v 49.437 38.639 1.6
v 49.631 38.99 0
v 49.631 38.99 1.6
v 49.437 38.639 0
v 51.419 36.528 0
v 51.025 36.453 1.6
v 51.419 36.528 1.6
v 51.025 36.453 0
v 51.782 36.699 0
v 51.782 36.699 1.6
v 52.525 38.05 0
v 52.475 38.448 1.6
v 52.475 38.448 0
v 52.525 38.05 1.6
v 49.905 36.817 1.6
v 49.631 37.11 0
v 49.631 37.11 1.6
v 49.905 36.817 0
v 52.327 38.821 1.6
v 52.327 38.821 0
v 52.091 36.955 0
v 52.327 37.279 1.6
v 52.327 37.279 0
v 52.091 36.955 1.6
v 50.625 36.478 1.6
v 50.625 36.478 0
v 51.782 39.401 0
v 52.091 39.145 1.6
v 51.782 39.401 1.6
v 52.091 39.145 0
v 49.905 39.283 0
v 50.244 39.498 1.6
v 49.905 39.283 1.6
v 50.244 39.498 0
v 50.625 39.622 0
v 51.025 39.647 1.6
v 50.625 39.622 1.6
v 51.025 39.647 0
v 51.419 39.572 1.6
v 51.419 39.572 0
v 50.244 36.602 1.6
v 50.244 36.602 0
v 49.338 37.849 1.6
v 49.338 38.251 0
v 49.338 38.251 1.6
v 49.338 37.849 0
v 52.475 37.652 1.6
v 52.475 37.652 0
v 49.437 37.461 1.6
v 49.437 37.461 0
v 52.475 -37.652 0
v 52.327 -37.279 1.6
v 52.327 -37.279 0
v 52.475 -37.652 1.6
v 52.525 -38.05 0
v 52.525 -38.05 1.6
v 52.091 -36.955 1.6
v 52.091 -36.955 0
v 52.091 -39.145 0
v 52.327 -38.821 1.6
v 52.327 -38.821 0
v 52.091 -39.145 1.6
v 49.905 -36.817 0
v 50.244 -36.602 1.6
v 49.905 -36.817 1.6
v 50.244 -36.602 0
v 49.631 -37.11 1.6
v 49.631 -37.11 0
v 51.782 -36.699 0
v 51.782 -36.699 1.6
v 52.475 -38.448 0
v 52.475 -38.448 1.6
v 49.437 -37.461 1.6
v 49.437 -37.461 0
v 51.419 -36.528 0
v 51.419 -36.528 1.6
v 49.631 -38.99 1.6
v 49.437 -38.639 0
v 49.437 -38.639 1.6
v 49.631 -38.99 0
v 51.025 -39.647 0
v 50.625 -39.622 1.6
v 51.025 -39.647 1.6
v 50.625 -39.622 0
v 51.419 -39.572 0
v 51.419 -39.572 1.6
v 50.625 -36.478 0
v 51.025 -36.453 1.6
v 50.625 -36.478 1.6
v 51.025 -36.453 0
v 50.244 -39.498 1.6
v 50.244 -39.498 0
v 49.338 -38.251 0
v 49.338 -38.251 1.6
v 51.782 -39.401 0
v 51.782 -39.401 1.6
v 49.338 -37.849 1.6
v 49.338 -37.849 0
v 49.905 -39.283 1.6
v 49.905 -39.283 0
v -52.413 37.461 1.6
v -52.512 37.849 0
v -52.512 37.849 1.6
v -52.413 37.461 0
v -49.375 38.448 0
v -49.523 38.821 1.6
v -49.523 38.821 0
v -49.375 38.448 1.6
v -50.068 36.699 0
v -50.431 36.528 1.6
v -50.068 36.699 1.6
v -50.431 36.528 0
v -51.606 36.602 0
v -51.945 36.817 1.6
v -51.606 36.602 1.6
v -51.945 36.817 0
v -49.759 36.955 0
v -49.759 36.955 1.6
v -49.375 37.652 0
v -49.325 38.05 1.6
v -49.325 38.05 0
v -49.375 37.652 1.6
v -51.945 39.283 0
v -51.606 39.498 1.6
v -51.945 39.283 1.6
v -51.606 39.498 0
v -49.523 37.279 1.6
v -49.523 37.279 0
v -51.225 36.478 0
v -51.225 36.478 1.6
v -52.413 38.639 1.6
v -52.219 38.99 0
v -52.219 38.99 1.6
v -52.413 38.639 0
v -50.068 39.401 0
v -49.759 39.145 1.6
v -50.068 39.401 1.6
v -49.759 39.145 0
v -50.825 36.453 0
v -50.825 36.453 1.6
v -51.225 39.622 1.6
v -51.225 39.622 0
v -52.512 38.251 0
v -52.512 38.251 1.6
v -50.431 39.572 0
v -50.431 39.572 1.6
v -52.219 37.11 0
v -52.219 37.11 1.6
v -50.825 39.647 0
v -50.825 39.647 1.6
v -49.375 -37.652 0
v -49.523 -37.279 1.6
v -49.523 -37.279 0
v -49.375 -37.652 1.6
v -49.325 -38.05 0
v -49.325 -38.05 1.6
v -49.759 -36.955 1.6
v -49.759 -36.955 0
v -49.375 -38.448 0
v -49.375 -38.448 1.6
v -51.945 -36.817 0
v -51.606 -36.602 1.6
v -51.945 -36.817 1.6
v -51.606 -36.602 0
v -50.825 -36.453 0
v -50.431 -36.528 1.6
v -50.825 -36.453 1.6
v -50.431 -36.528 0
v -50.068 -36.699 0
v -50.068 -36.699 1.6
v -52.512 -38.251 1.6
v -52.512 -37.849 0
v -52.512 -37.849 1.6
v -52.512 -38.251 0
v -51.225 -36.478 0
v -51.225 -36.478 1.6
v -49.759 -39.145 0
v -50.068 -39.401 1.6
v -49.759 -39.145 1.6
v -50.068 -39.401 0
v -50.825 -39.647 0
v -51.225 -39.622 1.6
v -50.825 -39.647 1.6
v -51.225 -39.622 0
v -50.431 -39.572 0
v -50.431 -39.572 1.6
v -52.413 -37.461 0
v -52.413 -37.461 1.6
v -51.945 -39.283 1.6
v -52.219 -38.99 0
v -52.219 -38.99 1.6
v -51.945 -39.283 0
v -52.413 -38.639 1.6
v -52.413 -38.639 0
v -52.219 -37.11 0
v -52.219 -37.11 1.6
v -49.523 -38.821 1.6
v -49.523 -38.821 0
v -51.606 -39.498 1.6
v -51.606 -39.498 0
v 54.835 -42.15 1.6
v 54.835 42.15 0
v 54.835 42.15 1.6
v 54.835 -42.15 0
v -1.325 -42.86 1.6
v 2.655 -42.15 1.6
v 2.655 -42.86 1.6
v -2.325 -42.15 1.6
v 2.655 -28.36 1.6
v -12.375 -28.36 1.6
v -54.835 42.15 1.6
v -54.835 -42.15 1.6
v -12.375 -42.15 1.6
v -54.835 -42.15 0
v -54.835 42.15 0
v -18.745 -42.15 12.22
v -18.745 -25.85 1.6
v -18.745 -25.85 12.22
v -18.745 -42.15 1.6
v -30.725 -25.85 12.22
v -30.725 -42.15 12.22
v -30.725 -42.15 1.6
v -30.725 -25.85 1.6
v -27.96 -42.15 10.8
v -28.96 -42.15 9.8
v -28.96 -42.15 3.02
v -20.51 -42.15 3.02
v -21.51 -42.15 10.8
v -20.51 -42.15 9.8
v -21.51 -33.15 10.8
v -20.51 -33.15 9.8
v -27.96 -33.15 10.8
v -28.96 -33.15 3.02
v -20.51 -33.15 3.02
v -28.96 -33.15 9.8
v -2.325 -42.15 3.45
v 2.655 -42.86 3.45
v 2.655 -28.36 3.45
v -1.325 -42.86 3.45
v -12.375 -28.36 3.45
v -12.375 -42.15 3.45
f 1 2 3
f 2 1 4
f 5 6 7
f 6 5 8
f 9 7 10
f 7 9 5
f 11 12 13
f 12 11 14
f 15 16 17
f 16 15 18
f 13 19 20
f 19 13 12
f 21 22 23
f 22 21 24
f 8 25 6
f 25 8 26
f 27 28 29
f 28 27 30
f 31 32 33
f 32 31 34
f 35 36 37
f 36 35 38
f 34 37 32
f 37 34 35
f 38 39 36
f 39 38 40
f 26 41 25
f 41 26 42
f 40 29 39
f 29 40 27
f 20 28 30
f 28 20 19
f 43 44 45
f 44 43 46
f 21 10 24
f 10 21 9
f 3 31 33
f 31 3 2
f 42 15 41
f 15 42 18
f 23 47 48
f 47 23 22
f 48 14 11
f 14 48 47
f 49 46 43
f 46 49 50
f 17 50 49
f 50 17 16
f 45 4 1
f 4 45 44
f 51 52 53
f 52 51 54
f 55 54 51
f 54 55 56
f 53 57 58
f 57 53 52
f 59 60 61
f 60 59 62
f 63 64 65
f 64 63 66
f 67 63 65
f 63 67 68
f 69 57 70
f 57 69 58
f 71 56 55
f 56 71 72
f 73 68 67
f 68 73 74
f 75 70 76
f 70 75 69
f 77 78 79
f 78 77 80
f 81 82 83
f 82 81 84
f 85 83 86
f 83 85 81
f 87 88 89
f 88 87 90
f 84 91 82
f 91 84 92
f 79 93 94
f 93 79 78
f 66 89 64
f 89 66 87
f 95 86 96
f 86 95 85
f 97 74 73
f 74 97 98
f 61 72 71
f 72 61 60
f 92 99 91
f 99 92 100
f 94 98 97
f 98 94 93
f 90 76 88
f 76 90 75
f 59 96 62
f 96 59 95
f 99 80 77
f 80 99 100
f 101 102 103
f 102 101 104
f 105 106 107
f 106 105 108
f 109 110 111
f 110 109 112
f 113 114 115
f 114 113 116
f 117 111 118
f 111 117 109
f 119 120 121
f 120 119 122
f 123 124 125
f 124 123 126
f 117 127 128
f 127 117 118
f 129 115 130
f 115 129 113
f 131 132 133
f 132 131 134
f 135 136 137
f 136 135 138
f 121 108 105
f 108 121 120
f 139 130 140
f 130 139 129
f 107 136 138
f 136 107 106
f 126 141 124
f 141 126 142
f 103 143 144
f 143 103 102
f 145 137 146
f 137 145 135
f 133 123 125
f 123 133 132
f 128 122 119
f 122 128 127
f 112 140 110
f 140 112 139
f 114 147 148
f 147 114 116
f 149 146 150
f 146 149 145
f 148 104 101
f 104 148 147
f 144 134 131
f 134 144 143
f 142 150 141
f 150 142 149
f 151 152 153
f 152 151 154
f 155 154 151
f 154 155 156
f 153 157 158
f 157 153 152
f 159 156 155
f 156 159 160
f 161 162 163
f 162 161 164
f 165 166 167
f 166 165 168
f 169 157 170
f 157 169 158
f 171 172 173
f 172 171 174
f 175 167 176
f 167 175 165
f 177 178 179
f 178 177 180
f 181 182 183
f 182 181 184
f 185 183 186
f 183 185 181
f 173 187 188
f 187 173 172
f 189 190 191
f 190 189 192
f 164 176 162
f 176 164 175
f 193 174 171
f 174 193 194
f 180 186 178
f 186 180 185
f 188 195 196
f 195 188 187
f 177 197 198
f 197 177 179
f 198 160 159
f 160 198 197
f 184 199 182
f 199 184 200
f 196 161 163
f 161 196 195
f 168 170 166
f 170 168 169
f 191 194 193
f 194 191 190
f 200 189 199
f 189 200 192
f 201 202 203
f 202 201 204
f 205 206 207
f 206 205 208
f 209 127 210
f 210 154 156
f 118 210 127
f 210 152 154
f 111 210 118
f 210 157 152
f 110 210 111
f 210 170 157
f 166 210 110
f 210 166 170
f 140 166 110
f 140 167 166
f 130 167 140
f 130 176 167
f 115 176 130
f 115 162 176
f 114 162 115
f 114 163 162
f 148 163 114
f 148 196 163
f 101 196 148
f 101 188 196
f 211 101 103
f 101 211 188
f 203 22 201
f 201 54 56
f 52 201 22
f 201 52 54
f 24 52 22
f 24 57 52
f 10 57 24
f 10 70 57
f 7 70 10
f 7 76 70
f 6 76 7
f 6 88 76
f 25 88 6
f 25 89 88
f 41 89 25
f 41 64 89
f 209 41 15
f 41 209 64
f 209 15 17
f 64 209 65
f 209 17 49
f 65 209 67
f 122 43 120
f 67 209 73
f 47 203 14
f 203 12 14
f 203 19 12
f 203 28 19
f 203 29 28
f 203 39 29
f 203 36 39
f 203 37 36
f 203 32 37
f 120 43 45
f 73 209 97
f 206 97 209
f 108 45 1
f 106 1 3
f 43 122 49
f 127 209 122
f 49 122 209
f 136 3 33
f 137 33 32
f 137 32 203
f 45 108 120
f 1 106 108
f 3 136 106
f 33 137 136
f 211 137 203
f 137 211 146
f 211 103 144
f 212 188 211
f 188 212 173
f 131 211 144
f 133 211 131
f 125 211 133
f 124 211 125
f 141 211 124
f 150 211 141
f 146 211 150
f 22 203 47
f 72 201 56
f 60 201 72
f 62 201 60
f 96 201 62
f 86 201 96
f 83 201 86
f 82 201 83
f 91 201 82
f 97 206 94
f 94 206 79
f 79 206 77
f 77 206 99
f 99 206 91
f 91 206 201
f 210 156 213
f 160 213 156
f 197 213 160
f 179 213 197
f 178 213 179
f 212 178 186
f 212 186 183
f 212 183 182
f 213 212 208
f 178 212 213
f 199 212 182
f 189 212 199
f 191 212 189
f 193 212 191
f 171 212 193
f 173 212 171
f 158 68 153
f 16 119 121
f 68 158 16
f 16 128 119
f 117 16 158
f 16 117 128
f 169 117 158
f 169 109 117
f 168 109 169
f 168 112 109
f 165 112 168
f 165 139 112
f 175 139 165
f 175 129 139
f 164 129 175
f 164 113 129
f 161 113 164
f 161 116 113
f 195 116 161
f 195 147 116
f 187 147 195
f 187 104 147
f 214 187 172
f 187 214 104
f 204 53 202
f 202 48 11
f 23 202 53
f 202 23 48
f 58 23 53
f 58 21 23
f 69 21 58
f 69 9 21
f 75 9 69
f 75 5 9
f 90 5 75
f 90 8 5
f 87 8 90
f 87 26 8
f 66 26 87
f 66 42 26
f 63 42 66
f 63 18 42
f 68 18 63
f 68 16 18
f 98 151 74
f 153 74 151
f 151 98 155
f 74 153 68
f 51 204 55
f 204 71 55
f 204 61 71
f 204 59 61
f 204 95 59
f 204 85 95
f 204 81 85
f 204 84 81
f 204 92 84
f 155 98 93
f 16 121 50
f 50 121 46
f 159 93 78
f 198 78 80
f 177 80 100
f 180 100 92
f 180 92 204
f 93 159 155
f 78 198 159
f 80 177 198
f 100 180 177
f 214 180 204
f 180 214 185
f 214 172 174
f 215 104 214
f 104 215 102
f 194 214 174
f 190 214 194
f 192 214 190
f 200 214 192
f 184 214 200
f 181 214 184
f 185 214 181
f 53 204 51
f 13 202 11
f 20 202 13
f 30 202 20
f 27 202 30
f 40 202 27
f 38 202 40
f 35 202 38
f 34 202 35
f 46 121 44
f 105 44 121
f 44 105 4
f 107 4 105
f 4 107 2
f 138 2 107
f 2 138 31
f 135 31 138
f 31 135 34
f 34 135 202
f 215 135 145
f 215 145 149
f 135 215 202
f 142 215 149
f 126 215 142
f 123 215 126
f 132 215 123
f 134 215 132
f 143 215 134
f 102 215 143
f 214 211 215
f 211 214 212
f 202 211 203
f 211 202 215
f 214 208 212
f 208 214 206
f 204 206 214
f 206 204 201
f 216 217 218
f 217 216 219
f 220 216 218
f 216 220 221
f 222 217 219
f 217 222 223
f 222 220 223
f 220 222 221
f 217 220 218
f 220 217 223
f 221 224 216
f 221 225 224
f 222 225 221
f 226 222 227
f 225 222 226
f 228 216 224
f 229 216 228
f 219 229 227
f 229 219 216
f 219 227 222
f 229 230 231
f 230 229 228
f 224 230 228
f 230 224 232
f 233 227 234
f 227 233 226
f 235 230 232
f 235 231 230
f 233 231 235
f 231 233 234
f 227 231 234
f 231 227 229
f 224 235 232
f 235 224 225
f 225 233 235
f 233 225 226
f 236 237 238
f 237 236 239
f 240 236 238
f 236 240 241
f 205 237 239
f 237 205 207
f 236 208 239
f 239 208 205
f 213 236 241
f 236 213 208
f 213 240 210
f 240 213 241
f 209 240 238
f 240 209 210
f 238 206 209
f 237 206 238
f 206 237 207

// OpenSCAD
// file: ../vitamins/uSD.scad
module uSD() {
    // Dimensions - mm
    sd_w = 57.49-42.46;
    sd_t = 1.85;
    pts = [[0,0],
           [sd_w,0],
           [sd_w,14.5],
           [11.05,14.5],
           [10.05,13.79],
           [0,13.79]];
    color("Silver") {
        translate([0,14.5,sd_t]) {       
            rotate([180,0,0]) {
                linear_extrude(height=sd_t)polygon(pts);
            }
        }
    }
}

uSD();
// file: ../vitamins/usb_b.scad
module usb_b_plug() {
    // Dimensions - mm
    plug_w = 8.45;
    plug_h = 7.78;
    plug_l = 10.0;

    $fn = 25;

    translate([-plug_w/2,plug_l,-plug_h/2])rotate([90,0,0]) {
        linear_extrude(height=plug_l){
            polygon([[0,0],
                    [plug_w,0],
                    [plug_w,plug_h-1],
                    [plug_w-1,plug_h],
                    [1,plug_h],
                    [0,plug_h-1]]);
        }
    }
}

module usb_b_jack() {
    // Dimensions - mm
    usb_l = 16.3;
    usb_w = 36.09-24.11;
    usb_h = 10.62;

    $fn=25;

    color("Silver")difference() {
        cube([usb_w, usb_l, usb_h]); // main body
        translate([usb_w/2,-1,usb_h/2])usb_b_plug();
    }
}

usb_b_jack();
// file: ../vitamins/pcb.scad
include <../settings/dimensions.scad>

module pcb() {
    color("Green") {
        difference() {
            translate([0,0,pcb_t/2])cube([pcb_l, pcb_w, pcb_t], center=true); // PCB

            for (x_quad=[1,-1]) {
                for (y_quad=[1,-1]) {
                    translate([x_quad*hole_x_spacing/2,y_quad*hole_y_spacing/2,-1])cylinder(h=pcb_t+2, d=hole_dia); // Holes
                }
            }
        }
    }
}

pcb();
// file: ../settings/dimensions.scad
// Defualt Quality
$fn = 25;

// PCB Dimensions - mm
pcb_l = 109.67;
pcb_w = 84.30;
pcb_t = 1.6;

hole_dia = 3.2;
hole_x_spacing = 101.85;
hole_y_spacing = 76.10;

// PCB Component Locations - mm from center
usb_x = (-pcb_l/2) + 24.11;
usb_y = (-pcb_w/2);

uSD_x = (-pcb_l/2) + 42.46;
uSD_y = (-pcb_w/2) - 0.71;

// TMC2130 Dimensions - mm
tmc_l = 20.32;
tmc_w = 15.24;
tmc_t = 1.6;
// main file
include <../settings/dimensions.scad>
use <../vitamins/pcb.scad>
use <../vitamins/usb_b.scad>
use <../vitamins/uSD.scad>

module skrV13() {
    pcb();

    translate([usb_x,usb_y,pcb_t])usb_b_jack();

    translate([uSD_x,uSD_y,pcb_t])uSD();
}

skrV13();
